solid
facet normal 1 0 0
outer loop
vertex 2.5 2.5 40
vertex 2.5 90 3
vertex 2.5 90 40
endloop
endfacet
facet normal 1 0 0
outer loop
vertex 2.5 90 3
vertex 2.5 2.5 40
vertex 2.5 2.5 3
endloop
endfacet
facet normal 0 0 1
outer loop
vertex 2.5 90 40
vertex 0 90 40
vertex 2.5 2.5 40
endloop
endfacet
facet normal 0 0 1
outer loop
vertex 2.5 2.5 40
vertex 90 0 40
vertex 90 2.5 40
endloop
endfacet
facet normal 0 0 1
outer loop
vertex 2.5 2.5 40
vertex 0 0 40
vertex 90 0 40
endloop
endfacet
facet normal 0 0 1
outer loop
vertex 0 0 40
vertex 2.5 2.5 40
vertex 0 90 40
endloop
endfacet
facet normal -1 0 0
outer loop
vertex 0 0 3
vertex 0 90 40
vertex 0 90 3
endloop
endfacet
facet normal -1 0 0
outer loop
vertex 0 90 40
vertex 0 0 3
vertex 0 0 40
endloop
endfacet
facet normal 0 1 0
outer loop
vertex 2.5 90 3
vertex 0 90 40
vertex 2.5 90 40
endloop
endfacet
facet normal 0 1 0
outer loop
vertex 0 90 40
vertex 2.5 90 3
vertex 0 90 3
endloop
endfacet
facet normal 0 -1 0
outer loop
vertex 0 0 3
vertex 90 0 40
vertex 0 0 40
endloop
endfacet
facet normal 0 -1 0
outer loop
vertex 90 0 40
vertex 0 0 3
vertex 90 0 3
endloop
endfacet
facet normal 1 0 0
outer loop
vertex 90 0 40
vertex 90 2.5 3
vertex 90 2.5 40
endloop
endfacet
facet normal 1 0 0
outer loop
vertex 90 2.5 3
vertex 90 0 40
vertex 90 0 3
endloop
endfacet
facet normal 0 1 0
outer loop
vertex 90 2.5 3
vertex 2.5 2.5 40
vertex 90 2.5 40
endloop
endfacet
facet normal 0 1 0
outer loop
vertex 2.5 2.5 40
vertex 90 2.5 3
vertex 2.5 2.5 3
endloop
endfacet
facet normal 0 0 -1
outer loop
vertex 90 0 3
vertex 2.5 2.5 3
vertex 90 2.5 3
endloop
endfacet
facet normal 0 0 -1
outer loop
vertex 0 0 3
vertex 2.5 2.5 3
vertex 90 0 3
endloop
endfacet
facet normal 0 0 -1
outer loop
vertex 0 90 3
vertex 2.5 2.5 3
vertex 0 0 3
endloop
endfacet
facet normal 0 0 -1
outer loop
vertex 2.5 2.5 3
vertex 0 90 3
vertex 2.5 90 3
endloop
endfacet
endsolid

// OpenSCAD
// Fan box - a top plate and four walls, open at the top, to house a PC case fan as a
// magnetic stirrer. NOVEL general part.
//

top     = 90;
length  = 90;
height  = 40;
wall    = 2.5;
screw   = 4.5;
cable   = 12;

$fn = 48;

plate_t = 2;

difference() {
    union() {
        cube([top, length, plate_t]);
        for (x = [-(length / 2 - wall / 2), length / 2 - wall / 2])
            cube([wall, length, height], p = [x, 0, 0]);
        for (y = [-(top / 2 - wall / 2), top / 2 - wall / 2])
            cube([length, wall, height], p = [0, y, 0]);
    }
    translate([0, 0, -1]) cube([top, length, plate_t + 2]);                 // clear the top surface
    for (x = [-71.5 / 2, 71.5 / 2], y = [-71.5 / 2, 71.5 / 2])
        translate([x, y, -1]) cylinder(h = plate_t + 2, d = screw);           // screw holes
    // one cable notch in a wall, reaching 8 mm down from the open edge (z = height - 8)
    translate([-(length / 2 - wall / 2 - cable / 2), 0, height - 8])
        cube([cable, length, wall + 1]);
}
